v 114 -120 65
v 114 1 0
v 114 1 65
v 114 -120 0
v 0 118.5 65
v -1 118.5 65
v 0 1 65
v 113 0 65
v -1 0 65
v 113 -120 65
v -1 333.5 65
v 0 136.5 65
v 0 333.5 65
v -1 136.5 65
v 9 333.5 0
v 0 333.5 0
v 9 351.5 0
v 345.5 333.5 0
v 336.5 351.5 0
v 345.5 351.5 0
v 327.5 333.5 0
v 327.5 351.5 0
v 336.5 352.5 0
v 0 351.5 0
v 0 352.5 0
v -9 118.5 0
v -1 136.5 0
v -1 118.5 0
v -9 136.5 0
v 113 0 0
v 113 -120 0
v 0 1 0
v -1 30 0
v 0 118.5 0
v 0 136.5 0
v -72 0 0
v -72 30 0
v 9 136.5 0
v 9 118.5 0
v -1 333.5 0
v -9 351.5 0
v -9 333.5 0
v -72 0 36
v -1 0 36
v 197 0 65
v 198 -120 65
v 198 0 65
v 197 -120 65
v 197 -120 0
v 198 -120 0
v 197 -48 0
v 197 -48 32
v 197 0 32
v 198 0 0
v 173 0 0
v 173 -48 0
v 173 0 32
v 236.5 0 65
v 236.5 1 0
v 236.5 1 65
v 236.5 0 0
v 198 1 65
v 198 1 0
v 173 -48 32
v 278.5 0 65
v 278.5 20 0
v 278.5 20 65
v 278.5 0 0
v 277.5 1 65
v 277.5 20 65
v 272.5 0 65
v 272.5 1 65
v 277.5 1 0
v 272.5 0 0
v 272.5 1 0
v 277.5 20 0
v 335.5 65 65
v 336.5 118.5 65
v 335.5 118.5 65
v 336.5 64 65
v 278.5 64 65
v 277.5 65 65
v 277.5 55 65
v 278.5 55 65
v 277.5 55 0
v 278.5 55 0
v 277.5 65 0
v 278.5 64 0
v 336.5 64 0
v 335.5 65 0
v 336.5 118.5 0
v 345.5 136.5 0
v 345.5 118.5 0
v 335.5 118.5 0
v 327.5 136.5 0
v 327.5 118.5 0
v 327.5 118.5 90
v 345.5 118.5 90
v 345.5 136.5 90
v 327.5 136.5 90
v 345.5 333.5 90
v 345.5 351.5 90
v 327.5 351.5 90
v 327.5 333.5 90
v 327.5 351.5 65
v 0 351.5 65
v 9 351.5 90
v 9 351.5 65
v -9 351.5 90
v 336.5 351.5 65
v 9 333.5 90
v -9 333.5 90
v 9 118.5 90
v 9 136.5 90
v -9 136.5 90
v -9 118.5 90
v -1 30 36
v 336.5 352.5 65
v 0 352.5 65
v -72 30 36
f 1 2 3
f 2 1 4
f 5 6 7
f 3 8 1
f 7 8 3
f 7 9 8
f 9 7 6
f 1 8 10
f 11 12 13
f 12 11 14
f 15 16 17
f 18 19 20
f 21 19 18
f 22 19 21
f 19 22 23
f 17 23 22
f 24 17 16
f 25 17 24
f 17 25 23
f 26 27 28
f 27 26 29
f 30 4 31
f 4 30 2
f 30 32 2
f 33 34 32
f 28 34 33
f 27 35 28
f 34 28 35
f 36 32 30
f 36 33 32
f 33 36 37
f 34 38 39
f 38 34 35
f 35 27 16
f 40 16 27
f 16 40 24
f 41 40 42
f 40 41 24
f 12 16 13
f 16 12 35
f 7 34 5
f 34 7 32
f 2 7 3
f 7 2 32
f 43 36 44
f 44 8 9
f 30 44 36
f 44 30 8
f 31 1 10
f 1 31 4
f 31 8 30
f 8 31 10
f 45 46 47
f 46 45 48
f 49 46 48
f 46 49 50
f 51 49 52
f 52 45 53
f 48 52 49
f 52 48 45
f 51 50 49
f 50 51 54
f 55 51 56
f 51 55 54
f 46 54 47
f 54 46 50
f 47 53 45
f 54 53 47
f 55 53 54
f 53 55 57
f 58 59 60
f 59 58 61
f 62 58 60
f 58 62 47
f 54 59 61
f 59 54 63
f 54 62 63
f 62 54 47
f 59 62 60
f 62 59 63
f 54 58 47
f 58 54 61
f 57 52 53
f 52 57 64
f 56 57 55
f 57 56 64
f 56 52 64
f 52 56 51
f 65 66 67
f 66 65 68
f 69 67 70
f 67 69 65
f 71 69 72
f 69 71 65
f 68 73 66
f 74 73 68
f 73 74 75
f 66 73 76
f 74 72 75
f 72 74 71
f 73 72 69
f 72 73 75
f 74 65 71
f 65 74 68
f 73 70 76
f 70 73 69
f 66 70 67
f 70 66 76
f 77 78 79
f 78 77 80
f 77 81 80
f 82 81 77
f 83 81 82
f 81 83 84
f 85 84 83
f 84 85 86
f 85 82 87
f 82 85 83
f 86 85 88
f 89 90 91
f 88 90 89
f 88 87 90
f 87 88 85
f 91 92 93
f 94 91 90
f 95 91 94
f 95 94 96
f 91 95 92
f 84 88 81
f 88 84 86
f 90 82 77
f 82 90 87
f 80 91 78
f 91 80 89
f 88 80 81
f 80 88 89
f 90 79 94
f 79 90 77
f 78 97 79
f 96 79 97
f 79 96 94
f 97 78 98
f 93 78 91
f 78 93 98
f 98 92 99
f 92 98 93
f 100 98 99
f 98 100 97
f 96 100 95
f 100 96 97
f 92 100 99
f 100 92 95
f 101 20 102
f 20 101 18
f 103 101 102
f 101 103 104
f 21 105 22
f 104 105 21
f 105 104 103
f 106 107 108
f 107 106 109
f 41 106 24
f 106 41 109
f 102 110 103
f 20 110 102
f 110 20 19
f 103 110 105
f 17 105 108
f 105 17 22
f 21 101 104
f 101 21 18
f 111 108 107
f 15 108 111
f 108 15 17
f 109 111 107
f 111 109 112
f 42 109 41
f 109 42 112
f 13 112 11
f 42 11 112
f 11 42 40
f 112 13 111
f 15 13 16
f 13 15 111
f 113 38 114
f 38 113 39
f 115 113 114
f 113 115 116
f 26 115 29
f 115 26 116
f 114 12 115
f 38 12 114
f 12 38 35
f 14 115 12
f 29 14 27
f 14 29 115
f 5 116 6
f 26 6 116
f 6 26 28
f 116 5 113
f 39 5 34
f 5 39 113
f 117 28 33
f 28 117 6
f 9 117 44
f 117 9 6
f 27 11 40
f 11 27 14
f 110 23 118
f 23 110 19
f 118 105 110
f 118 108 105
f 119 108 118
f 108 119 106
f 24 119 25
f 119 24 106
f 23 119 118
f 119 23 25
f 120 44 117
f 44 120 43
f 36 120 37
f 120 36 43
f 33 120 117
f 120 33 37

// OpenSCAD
DeskDim = [30,72,36];
//todo: toss these values in an array, add up the previous values as part of the operation to more easily add more wall? ehhh.
WallBehindJosh = 114;
HallwayWidth = 7*12;
BinDepth = 25;
BinHeight = 32;
BinLength = 48;
HallToZone = 38.5;
DoorWidth = 36;
ZoneToFocusCorner = 6;
CornerToFocus = 19;
FocusToWall = 10;
FocusDepth = CornerToFocus + DoorWidth + FocusToWall;
FocusCornerToWhiteboard = 58;
CornerWhiteboardToG = 53.5;
PillarDepth = 9;
PillarDiameter = 18;
PillarToPillar = 206;
PillarToWindow = 15;
JoshCornerToPillar = 115;
MarginOfError = JoshCornerToPillar - CornerToFocus - FocusToWall - DoorWidth - CornerWhiteboardToG;

LeftCorner = [WallBehindJosh+HallwayWidth+HallToZone+DoorWidth+ZoneToFocusCorner+FocusCornerToWhiteboard, 0, 0];
RightCorner = [0, 0, 0];
BackCorner = [LeftCorner.x, FocusDepth+CornerWhiteboardToG+PillarDepth+PillarToPillar+PillarDepth, 0];
FrontCorner = [0, BackCorner.y, 0];


module wall(length){
    cube([length, 1, 65]);
}

module sidewall(length){
    rotate([0,0,90]) wall(length);    
}

module pillar(){
    cube([PillarDiameter,PillarDiameter,90]);
}

module window(){ 
    translate([0,-2,33]) cube([78,4,66.5]);   
}


wall(WallBehindJosh);

translate ([WallBehindJosh,-120,0]) sidewall(120);

translate ([WallBehindJosh+HallwayWidth, -120, 0]) sidewall(120);

translate([WallBehindJosh+HallwayWidth, 0, 0]) wall(HallToZone);

//recycling/compost/trash bins
translate([WallBehindJosh+HallwayWidth-BinDepth,-BinLength, 0]){ 
    cube([BinDepth, BinLength, BinHeight]);
}
translate([WallBehindJosh+HallwayWidth+HallToZone+DoorWidth, 0, 0]){ 
    wall(ZoneToFocusCorner);
}
translate([WallBehindJosh+HallwayWidth+HallToZone+DoorWidth+ZoneToFocusCorner, 1, 0]){
    sidewall(CornerToFocus);
}
translate([-FocusCornerToWhiteboard, CornerToFocus+DoorWidth, 0]){
    translate(LeftCorner) sidewall(FocusToWall);
}

translate([-FocusCornerToWhiteboard, CornerToFocus+DoorWidth+FocusToWall-1, 0]){
    translate(LeftCorner) wall(FocusCornerToWhiteboard);
}

translate([LeftCorner.x, FocusDepth, LeftCorner.z]){
    sidewall(CornerWhiteboardToG);
}

translate([LeftCorner.x-PillarDepth, LeftCorner.y+FocusDepth+CornerWhiteboardToG, LeftCorner.z]){
    pillar();
}

translate([BackCorner.x-PillarDepth, BackCorner.y-PillarDepth, BackCorner.z]){
    pillar();
}


translate([FrontCorner.x-PillarDepth, FrontCorner.y-PillarDepth, FrontCorner.z]){
    pillar();
}



translate([FrontCorner.x-PillarDepth, LeftCorner.y+FocusDepth+CornerWhiteboardToG, 0]){
    pillar();
}

sidewall(FrontCorner.y);

//rear wall
translate([FrontCorner.x, FrontCorner.y+PillarDepth, FrontCorner.z]){
    wall(BackCorner.x);
}

translate([0,0,0]) rotate([0,0,90]) cube(DeskDim);
